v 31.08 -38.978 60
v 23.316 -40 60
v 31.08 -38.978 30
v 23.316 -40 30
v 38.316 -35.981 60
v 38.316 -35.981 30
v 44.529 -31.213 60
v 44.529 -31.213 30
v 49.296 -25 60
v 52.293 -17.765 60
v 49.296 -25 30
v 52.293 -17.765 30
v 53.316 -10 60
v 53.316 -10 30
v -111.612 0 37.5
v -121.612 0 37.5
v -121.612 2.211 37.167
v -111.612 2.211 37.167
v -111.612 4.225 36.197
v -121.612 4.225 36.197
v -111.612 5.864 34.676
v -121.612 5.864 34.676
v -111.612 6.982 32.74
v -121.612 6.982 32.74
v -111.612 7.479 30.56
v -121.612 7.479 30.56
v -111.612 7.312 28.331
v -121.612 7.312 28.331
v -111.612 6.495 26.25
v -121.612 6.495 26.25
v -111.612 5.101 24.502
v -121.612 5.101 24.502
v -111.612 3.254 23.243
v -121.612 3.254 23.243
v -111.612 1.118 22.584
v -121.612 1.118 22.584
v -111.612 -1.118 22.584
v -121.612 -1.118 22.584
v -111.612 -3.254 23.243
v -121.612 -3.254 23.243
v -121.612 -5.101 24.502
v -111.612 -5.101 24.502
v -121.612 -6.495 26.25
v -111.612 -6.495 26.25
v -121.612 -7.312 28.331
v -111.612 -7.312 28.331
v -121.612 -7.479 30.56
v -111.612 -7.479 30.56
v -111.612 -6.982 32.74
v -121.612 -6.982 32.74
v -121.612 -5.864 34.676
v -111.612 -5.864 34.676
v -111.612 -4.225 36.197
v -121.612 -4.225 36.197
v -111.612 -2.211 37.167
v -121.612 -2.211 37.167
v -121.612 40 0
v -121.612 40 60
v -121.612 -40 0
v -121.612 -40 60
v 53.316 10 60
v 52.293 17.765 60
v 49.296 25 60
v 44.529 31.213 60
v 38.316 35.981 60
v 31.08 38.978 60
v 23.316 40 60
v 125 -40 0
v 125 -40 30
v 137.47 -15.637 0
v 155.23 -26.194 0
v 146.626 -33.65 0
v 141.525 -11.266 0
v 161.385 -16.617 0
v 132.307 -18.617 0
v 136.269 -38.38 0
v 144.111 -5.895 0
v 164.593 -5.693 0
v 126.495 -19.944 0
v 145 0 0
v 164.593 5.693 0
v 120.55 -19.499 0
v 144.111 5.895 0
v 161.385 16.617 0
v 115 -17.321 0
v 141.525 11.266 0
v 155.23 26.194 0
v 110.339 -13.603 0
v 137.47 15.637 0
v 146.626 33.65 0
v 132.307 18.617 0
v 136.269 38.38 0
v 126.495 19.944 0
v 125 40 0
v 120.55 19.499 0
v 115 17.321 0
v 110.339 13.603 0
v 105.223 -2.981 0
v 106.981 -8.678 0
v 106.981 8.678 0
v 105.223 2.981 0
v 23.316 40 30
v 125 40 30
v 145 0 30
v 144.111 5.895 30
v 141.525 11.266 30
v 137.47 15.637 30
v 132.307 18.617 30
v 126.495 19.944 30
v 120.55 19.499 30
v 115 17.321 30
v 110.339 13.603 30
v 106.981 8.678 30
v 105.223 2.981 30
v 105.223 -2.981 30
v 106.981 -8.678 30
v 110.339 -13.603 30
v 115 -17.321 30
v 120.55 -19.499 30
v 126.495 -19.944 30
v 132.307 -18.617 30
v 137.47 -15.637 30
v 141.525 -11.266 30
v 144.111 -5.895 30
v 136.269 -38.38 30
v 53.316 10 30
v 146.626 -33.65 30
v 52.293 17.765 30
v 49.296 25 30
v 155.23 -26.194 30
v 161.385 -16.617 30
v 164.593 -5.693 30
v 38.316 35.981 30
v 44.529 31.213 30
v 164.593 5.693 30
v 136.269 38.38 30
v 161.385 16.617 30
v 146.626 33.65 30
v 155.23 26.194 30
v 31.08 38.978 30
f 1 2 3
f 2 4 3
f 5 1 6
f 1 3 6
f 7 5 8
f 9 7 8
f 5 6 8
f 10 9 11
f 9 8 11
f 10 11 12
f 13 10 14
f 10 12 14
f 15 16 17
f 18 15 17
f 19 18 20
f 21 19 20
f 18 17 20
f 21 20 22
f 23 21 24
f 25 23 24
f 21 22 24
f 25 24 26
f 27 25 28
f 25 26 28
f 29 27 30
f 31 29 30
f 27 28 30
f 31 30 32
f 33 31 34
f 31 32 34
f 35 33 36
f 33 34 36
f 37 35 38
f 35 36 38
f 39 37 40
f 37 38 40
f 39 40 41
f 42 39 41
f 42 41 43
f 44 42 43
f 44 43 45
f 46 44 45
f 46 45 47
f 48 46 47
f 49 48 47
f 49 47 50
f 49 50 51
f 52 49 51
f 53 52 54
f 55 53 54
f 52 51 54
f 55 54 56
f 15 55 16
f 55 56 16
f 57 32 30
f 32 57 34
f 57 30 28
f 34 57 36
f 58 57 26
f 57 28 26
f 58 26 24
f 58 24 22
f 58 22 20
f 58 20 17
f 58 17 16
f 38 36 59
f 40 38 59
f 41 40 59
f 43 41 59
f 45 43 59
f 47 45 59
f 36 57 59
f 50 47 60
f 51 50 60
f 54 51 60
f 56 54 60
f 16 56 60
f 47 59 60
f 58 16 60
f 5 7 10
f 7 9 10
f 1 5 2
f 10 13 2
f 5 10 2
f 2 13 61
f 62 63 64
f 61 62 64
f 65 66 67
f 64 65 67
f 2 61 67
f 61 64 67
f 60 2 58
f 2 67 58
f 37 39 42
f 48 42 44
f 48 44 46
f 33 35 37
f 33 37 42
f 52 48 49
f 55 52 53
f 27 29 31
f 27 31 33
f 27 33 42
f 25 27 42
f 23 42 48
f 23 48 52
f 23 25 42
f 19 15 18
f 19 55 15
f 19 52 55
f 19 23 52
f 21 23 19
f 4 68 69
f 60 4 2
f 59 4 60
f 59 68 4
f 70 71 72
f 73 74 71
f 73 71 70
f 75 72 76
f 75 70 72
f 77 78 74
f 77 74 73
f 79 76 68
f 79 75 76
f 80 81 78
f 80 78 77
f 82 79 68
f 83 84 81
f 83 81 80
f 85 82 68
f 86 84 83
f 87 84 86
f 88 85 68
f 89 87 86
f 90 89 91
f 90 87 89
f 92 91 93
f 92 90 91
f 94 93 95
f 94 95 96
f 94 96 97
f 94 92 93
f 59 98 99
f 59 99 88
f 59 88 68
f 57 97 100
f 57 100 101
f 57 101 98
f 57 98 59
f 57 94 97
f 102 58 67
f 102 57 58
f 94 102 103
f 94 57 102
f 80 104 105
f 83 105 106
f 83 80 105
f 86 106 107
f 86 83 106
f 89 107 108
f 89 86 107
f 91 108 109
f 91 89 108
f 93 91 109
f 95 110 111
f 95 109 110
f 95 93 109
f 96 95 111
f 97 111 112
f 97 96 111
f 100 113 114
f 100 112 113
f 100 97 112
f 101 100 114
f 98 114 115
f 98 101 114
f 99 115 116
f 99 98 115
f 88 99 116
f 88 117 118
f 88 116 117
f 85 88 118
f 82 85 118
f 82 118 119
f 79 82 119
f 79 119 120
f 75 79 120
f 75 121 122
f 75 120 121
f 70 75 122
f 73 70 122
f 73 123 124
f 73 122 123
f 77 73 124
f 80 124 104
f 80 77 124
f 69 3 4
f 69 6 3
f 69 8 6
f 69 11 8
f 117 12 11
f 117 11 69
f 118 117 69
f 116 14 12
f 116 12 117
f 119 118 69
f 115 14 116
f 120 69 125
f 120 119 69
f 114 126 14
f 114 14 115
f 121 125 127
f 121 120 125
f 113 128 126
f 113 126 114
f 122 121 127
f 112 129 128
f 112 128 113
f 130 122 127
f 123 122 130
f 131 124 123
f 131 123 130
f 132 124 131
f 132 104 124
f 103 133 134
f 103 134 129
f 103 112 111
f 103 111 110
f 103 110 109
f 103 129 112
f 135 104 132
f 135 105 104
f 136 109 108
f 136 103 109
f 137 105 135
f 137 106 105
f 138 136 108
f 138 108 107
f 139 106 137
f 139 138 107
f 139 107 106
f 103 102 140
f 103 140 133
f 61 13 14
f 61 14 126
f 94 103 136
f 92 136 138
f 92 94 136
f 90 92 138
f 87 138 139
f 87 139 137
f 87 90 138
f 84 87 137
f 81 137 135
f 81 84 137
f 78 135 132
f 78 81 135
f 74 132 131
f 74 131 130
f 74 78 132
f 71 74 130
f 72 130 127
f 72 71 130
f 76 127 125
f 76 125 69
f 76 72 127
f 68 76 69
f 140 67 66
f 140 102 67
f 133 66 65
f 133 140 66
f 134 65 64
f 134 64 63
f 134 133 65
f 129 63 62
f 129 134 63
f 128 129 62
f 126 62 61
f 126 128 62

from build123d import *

# Parameters (mm, degrees)
SKETCH1_R           = 20
BOSS_EXTRUDE1_DEPTH = 60
SKETCH2_R           = 45
CUT_EXTRUDE1_DEPTH  = 30
CUT_EXTRUDE2_DEPTH  = 131
SKETCH4_R           = 7.5
CUT_EXTRUDE3_DEPTH  = 10
SKETCH5_W           = 53.741916818
SKETCH5_H           = 80
CUT_EXTRUDE7_DEPTH  = 30
FILLET1_R           = 30


with BuildPart() as part:
    # Sketch1 → Boss-Extrude1 (new body)
    with BuildSketch(Plane.XY):
        with BuildLine():
            Line((-150, 40), (125, 40))
            ThreePointArc((125, 40), (165, 0), (125, -40))
            Line((125, -40), (-150, -40))
            ThreePointArc((-150, -40), (-190, 0), (-150, 40))
        make_face()
        with Locations((-150, 0)):
            Circle(SKETCH1_R, mode=Mode.SUBTRACT)
        with Locations((125, 0)):
            Circle(SKETCH1_R, mode=Mode.SUBTRACT)
    extrude(amount=BOSS_EXTRUDE1_DEPTH)

    # Sketch2 → Cut-Extrude1 (cut)
    with BuildSketch(Plane.XY.offset(60)):
        with Locations((125, 0)):
            Circle(SKETCH2_R)
    extrude(amount=-CUT_EXTRUDE1_DEPTH, mode=Mode.SUBTRACT)

    # Sketch3 → Cut-Extrude2 (cut)
    with BuildSketch(Plane.XZ.offset(40)):
        Polygon((-150, 60), (-210.17287427, 60), (-210.17287427, 0), (-121.61196852, 0), (-121.61196852, 60), (-130, 60), align=None)
    extrude(amount=-CUT_EXTRUDE2_DEPTH, mode=Mode.SUBTRACT)

    # Sketch4 → Cut-Extrude3 (cut)
    with BuildSketch(Plane.ZY.offset(121.61196852)):
        with Locations((30, 0)):
            Circle(SKETCH4_R)
    extrude(amount=-CUT_EXTRUDE3_DEPTH, mode=Mode.SUBTRACT)

    # Sketch5 → Cut-Extrude7 (cut)
    with BuildSketch(Plane.XY.offset(60)):
        with Locations((80.186599238, 0)):
            Rectangle(SKETCH5_W, SKETCH5_H)
    extrude(amount=-CUT_EXTRUDE7_DEPTH, mode=Mode.SUBTRACT)

    # Fillet1
    fillet1_edges = [part.edges().sort_by_distance(p)[0] for p in [
        (53.315640829, 40, 45),
        (53.315640829, -40, 45),
    ]]
    fillet(fillet1_edges, radius=FILLET1_R)


solid = part.part
